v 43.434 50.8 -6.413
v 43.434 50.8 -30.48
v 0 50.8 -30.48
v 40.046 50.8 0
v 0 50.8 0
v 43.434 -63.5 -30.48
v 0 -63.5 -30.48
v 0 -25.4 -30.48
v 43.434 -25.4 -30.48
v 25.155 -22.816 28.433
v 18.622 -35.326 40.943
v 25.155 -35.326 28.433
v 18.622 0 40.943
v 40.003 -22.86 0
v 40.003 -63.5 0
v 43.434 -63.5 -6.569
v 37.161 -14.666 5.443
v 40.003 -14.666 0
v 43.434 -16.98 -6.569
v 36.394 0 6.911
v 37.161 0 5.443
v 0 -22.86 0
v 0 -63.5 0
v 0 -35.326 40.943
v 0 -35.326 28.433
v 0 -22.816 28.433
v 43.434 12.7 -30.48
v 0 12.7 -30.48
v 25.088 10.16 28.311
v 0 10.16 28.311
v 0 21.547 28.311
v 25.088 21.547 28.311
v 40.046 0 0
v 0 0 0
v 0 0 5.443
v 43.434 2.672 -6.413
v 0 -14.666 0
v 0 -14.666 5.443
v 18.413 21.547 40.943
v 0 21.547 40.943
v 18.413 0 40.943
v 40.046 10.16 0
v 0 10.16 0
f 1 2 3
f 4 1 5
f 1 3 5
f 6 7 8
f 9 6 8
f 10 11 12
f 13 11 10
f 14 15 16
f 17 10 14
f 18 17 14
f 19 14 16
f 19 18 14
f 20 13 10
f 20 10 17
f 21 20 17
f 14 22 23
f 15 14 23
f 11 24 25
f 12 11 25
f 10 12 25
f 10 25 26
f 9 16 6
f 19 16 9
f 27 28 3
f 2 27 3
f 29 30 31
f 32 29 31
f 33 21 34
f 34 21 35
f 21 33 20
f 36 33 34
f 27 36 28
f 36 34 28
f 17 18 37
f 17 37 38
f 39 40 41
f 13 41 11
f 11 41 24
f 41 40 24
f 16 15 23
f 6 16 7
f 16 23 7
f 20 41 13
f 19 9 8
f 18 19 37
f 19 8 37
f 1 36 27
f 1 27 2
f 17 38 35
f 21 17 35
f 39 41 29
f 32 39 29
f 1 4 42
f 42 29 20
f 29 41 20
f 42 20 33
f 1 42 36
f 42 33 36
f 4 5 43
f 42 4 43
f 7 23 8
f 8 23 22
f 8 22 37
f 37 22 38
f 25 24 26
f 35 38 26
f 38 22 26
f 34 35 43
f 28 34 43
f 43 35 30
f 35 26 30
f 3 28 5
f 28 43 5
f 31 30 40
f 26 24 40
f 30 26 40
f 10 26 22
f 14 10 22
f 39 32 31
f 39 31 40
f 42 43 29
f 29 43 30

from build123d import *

# Parameters (mm, degrees)
F1_DEPTH = 43.434
F3_DEPTH = 57.404
F5_DEPTH = 71.628


with BuildPart() as f1:
    # F0 (on Right) → F1 (new body)
    with BuildSketch(Plane.YZ):
        Polygon((21.547339, 40.943282), (-35.326082, 40.943282), (-35.326082, 28.432836), (-22.815635, 28.432836), (-22.86, 0), (-63.5, 0), (-63.5, -30.48), (-25.4, -30.48), (-14.66608, 0), (-14.66608, 5.442686), (0, 5.442686), (0, 0), (12.7, -30.48), (50.8, -30.48), (50.8, 0), (10.16, 0), (10.16, 28.311027), (21.547339, 28.311027), align=None)
    extrude(amount=F1_DEPTH)

    # F2 (on Front) → F3 (cut)
    with BuildSketch(Plane.XZ):
        Polygon((15.067352, 47.276348), (45.27159, -9.890955), (45.27159, 47.276348), align=None)
    extrude(amount=-F3_DEPTH, mode=Mode.SUBTRACT)

    # F4 (on Front) → F5 (cut)
    with BuildSketch(Plane.XZ):
        Polygon((17.860672, 42.400945), (45.15991, -9.874192), (45.15991, 42.400945), align=None)
    extrude(amount=F5_DEPTH, mode=Mode.SUBTRACT)


solid = f1.part
